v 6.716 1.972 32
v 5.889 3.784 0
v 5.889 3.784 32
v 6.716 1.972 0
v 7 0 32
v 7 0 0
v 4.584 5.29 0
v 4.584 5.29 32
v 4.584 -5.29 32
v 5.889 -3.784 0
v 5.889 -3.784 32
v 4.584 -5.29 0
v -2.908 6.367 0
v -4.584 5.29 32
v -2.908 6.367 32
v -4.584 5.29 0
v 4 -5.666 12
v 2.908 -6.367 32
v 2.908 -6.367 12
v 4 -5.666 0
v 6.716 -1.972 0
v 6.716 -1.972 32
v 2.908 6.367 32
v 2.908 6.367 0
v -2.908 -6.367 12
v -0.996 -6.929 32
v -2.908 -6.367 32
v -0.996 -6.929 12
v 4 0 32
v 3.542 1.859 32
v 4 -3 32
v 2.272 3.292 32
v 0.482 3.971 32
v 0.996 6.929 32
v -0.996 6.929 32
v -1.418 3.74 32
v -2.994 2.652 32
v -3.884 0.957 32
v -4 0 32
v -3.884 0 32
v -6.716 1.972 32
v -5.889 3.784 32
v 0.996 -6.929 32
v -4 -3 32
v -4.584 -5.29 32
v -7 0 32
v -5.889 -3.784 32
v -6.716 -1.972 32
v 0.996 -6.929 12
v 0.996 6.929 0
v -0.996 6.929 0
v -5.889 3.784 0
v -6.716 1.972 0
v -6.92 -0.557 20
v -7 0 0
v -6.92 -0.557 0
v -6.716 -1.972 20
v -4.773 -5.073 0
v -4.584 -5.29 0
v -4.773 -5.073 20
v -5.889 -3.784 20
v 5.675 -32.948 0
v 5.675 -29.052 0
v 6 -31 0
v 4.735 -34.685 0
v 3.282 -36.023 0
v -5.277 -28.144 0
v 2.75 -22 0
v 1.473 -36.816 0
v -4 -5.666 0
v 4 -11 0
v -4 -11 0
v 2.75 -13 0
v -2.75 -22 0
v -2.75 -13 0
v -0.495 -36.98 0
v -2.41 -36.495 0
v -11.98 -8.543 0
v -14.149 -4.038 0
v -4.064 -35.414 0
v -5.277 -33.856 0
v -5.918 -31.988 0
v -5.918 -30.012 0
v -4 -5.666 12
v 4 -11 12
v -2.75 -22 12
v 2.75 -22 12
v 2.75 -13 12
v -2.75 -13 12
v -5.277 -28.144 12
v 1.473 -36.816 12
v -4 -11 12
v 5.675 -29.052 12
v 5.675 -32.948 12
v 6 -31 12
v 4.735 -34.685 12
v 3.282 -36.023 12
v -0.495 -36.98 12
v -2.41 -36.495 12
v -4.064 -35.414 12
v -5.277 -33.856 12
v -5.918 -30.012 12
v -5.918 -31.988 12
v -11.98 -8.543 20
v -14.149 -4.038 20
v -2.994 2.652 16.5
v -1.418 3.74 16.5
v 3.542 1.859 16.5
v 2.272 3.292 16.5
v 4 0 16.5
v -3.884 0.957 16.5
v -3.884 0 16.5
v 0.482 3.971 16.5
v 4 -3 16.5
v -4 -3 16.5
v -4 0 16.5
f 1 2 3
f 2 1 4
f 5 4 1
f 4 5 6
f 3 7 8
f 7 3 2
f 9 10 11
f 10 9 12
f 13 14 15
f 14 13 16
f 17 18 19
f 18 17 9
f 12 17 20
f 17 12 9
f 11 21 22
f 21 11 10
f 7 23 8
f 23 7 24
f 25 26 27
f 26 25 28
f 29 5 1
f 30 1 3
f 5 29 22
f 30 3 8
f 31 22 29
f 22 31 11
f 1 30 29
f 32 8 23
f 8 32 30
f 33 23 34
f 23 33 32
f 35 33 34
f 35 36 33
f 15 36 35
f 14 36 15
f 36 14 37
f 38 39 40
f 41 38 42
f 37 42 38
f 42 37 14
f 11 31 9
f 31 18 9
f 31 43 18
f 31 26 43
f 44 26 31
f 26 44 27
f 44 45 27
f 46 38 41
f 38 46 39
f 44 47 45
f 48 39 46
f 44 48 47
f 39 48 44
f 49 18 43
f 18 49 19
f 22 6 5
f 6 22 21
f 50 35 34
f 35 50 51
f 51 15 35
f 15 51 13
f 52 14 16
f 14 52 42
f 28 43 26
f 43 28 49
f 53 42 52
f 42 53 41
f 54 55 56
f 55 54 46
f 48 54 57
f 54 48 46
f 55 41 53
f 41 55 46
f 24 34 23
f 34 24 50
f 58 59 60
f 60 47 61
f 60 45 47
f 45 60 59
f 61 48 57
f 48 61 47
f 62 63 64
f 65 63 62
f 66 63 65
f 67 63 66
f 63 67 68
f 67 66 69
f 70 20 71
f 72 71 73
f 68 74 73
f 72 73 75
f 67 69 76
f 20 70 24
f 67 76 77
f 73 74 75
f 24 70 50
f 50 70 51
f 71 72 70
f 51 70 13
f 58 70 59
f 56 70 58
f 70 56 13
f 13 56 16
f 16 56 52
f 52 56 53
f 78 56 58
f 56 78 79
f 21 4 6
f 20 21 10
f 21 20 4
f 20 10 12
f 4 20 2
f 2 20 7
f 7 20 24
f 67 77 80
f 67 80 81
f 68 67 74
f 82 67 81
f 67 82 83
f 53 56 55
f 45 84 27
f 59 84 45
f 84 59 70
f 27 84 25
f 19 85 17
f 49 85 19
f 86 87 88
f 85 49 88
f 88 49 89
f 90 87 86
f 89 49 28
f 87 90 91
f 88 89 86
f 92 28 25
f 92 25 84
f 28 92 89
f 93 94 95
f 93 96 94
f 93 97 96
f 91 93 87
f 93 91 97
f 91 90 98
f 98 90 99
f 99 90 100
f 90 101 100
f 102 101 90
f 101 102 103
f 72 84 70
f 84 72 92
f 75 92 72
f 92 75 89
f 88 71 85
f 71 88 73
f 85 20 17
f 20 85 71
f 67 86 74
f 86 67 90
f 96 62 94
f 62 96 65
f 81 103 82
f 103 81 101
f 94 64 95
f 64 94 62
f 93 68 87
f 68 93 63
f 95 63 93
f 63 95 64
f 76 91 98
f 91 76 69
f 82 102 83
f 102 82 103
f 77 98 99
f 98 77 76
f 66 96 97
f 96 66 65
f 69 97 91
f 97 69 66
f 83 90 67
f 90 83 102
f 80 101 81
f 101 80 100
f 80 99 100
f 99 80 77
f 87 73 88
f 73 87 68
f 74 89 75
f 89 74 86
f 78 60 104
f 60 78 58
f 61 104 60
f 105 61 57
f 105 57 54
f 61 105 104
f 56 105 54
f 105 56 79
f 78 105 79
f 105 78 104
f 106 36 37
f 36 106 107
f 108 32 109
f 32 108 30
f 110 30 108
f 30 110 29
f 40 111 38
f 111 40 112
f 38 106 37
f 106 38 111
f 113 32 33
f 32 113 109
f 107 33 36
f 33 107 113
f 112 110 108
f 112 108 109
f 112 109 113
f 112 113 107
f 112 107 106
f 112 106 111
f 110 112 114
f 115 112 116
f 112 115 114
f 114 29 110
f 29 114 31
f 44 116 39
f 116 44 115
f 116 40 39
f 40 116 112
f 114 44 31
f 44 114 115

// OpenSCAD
rou = 7;
rin = 4;
height = 40-8;
depth = 15.5;

bras_thick = 5.5;
bras_length = 17;
bras_height = 12;
buttonr = 6;
alpha = atan(5/13);
//omega = atan(30/13);
omega = atan(27/13);

knob();


module knob(){
    difference(){
        union(){
            frame();
            butee(8);
            //cylinder(r=-(-rin-7-2.7),h=bras_height);
            //rotate([0,0,-omega])scale([3,1,1])butee();
        }
        translate([0,0,height-depth])cylinder(r=rin, h=depth+1);
        translate([-rin,-rin-rin,height-depth])cube([2*rin,2*rin,depth+1]);
    }
    intersection(){
        translate([-rin,-rin-7,height-depth])cube([2*rin,2*rin,depth]);
            cylinder(r=rou, h=height);
    }
}

module frame(){
    union(){
        cylinder(r=rou, h=height);
        // jointure poignée et centre
        hull(){
          translate([-rin,-rin-7,0])cube([2*rin,2*rin,bras_height]);
          translate([-bras_thick/2,-7-rin-2,0])cube([bras_thick,2,bras_height]);
        }
        // extremite poignée
        hull(){
          translate([0,-rou-bras_length-rou,0])cylinder(r=buttonr,h=bras_height);
          translate([-bras_thick/2,-bras_length-rou,0])cube([bras_thick,2,bras_height]);
        }
        translate([-bras_thick/2,-bras_length-rou,0])cube([bras_thick,bras_length,bras_height]);
    }

}

module butee(add=0){
    hauteur = bras_height + add;
    length = 14.5;
    rotate([0,0,-omega])translate([-5/2,-length,0])cube([5,length,hauteur]);
//    difference(){
//        translate([-rin,-rin-7-2.7,0])cube([2*rin,2*rin+2.7,hauteur]);
//        translate([-rin,-rin-7-2.7,0])rotate([0,0,45])cube([2,2,2.5*hauteur],center=true);
//        translate([rin,-rin-7-2.7,0])rotate([0,0,45])cube([2,2,2.5*hauteur],center=true);
//    }
//    hull(){
//      translate([-rin,-rin-7,0])cube([2*rin,2*rin,bras_height]);
//      translate([-bras_thick/2,-7-rin-2,0])cube([bras_thick,2,bras_height]);
//    }
}
